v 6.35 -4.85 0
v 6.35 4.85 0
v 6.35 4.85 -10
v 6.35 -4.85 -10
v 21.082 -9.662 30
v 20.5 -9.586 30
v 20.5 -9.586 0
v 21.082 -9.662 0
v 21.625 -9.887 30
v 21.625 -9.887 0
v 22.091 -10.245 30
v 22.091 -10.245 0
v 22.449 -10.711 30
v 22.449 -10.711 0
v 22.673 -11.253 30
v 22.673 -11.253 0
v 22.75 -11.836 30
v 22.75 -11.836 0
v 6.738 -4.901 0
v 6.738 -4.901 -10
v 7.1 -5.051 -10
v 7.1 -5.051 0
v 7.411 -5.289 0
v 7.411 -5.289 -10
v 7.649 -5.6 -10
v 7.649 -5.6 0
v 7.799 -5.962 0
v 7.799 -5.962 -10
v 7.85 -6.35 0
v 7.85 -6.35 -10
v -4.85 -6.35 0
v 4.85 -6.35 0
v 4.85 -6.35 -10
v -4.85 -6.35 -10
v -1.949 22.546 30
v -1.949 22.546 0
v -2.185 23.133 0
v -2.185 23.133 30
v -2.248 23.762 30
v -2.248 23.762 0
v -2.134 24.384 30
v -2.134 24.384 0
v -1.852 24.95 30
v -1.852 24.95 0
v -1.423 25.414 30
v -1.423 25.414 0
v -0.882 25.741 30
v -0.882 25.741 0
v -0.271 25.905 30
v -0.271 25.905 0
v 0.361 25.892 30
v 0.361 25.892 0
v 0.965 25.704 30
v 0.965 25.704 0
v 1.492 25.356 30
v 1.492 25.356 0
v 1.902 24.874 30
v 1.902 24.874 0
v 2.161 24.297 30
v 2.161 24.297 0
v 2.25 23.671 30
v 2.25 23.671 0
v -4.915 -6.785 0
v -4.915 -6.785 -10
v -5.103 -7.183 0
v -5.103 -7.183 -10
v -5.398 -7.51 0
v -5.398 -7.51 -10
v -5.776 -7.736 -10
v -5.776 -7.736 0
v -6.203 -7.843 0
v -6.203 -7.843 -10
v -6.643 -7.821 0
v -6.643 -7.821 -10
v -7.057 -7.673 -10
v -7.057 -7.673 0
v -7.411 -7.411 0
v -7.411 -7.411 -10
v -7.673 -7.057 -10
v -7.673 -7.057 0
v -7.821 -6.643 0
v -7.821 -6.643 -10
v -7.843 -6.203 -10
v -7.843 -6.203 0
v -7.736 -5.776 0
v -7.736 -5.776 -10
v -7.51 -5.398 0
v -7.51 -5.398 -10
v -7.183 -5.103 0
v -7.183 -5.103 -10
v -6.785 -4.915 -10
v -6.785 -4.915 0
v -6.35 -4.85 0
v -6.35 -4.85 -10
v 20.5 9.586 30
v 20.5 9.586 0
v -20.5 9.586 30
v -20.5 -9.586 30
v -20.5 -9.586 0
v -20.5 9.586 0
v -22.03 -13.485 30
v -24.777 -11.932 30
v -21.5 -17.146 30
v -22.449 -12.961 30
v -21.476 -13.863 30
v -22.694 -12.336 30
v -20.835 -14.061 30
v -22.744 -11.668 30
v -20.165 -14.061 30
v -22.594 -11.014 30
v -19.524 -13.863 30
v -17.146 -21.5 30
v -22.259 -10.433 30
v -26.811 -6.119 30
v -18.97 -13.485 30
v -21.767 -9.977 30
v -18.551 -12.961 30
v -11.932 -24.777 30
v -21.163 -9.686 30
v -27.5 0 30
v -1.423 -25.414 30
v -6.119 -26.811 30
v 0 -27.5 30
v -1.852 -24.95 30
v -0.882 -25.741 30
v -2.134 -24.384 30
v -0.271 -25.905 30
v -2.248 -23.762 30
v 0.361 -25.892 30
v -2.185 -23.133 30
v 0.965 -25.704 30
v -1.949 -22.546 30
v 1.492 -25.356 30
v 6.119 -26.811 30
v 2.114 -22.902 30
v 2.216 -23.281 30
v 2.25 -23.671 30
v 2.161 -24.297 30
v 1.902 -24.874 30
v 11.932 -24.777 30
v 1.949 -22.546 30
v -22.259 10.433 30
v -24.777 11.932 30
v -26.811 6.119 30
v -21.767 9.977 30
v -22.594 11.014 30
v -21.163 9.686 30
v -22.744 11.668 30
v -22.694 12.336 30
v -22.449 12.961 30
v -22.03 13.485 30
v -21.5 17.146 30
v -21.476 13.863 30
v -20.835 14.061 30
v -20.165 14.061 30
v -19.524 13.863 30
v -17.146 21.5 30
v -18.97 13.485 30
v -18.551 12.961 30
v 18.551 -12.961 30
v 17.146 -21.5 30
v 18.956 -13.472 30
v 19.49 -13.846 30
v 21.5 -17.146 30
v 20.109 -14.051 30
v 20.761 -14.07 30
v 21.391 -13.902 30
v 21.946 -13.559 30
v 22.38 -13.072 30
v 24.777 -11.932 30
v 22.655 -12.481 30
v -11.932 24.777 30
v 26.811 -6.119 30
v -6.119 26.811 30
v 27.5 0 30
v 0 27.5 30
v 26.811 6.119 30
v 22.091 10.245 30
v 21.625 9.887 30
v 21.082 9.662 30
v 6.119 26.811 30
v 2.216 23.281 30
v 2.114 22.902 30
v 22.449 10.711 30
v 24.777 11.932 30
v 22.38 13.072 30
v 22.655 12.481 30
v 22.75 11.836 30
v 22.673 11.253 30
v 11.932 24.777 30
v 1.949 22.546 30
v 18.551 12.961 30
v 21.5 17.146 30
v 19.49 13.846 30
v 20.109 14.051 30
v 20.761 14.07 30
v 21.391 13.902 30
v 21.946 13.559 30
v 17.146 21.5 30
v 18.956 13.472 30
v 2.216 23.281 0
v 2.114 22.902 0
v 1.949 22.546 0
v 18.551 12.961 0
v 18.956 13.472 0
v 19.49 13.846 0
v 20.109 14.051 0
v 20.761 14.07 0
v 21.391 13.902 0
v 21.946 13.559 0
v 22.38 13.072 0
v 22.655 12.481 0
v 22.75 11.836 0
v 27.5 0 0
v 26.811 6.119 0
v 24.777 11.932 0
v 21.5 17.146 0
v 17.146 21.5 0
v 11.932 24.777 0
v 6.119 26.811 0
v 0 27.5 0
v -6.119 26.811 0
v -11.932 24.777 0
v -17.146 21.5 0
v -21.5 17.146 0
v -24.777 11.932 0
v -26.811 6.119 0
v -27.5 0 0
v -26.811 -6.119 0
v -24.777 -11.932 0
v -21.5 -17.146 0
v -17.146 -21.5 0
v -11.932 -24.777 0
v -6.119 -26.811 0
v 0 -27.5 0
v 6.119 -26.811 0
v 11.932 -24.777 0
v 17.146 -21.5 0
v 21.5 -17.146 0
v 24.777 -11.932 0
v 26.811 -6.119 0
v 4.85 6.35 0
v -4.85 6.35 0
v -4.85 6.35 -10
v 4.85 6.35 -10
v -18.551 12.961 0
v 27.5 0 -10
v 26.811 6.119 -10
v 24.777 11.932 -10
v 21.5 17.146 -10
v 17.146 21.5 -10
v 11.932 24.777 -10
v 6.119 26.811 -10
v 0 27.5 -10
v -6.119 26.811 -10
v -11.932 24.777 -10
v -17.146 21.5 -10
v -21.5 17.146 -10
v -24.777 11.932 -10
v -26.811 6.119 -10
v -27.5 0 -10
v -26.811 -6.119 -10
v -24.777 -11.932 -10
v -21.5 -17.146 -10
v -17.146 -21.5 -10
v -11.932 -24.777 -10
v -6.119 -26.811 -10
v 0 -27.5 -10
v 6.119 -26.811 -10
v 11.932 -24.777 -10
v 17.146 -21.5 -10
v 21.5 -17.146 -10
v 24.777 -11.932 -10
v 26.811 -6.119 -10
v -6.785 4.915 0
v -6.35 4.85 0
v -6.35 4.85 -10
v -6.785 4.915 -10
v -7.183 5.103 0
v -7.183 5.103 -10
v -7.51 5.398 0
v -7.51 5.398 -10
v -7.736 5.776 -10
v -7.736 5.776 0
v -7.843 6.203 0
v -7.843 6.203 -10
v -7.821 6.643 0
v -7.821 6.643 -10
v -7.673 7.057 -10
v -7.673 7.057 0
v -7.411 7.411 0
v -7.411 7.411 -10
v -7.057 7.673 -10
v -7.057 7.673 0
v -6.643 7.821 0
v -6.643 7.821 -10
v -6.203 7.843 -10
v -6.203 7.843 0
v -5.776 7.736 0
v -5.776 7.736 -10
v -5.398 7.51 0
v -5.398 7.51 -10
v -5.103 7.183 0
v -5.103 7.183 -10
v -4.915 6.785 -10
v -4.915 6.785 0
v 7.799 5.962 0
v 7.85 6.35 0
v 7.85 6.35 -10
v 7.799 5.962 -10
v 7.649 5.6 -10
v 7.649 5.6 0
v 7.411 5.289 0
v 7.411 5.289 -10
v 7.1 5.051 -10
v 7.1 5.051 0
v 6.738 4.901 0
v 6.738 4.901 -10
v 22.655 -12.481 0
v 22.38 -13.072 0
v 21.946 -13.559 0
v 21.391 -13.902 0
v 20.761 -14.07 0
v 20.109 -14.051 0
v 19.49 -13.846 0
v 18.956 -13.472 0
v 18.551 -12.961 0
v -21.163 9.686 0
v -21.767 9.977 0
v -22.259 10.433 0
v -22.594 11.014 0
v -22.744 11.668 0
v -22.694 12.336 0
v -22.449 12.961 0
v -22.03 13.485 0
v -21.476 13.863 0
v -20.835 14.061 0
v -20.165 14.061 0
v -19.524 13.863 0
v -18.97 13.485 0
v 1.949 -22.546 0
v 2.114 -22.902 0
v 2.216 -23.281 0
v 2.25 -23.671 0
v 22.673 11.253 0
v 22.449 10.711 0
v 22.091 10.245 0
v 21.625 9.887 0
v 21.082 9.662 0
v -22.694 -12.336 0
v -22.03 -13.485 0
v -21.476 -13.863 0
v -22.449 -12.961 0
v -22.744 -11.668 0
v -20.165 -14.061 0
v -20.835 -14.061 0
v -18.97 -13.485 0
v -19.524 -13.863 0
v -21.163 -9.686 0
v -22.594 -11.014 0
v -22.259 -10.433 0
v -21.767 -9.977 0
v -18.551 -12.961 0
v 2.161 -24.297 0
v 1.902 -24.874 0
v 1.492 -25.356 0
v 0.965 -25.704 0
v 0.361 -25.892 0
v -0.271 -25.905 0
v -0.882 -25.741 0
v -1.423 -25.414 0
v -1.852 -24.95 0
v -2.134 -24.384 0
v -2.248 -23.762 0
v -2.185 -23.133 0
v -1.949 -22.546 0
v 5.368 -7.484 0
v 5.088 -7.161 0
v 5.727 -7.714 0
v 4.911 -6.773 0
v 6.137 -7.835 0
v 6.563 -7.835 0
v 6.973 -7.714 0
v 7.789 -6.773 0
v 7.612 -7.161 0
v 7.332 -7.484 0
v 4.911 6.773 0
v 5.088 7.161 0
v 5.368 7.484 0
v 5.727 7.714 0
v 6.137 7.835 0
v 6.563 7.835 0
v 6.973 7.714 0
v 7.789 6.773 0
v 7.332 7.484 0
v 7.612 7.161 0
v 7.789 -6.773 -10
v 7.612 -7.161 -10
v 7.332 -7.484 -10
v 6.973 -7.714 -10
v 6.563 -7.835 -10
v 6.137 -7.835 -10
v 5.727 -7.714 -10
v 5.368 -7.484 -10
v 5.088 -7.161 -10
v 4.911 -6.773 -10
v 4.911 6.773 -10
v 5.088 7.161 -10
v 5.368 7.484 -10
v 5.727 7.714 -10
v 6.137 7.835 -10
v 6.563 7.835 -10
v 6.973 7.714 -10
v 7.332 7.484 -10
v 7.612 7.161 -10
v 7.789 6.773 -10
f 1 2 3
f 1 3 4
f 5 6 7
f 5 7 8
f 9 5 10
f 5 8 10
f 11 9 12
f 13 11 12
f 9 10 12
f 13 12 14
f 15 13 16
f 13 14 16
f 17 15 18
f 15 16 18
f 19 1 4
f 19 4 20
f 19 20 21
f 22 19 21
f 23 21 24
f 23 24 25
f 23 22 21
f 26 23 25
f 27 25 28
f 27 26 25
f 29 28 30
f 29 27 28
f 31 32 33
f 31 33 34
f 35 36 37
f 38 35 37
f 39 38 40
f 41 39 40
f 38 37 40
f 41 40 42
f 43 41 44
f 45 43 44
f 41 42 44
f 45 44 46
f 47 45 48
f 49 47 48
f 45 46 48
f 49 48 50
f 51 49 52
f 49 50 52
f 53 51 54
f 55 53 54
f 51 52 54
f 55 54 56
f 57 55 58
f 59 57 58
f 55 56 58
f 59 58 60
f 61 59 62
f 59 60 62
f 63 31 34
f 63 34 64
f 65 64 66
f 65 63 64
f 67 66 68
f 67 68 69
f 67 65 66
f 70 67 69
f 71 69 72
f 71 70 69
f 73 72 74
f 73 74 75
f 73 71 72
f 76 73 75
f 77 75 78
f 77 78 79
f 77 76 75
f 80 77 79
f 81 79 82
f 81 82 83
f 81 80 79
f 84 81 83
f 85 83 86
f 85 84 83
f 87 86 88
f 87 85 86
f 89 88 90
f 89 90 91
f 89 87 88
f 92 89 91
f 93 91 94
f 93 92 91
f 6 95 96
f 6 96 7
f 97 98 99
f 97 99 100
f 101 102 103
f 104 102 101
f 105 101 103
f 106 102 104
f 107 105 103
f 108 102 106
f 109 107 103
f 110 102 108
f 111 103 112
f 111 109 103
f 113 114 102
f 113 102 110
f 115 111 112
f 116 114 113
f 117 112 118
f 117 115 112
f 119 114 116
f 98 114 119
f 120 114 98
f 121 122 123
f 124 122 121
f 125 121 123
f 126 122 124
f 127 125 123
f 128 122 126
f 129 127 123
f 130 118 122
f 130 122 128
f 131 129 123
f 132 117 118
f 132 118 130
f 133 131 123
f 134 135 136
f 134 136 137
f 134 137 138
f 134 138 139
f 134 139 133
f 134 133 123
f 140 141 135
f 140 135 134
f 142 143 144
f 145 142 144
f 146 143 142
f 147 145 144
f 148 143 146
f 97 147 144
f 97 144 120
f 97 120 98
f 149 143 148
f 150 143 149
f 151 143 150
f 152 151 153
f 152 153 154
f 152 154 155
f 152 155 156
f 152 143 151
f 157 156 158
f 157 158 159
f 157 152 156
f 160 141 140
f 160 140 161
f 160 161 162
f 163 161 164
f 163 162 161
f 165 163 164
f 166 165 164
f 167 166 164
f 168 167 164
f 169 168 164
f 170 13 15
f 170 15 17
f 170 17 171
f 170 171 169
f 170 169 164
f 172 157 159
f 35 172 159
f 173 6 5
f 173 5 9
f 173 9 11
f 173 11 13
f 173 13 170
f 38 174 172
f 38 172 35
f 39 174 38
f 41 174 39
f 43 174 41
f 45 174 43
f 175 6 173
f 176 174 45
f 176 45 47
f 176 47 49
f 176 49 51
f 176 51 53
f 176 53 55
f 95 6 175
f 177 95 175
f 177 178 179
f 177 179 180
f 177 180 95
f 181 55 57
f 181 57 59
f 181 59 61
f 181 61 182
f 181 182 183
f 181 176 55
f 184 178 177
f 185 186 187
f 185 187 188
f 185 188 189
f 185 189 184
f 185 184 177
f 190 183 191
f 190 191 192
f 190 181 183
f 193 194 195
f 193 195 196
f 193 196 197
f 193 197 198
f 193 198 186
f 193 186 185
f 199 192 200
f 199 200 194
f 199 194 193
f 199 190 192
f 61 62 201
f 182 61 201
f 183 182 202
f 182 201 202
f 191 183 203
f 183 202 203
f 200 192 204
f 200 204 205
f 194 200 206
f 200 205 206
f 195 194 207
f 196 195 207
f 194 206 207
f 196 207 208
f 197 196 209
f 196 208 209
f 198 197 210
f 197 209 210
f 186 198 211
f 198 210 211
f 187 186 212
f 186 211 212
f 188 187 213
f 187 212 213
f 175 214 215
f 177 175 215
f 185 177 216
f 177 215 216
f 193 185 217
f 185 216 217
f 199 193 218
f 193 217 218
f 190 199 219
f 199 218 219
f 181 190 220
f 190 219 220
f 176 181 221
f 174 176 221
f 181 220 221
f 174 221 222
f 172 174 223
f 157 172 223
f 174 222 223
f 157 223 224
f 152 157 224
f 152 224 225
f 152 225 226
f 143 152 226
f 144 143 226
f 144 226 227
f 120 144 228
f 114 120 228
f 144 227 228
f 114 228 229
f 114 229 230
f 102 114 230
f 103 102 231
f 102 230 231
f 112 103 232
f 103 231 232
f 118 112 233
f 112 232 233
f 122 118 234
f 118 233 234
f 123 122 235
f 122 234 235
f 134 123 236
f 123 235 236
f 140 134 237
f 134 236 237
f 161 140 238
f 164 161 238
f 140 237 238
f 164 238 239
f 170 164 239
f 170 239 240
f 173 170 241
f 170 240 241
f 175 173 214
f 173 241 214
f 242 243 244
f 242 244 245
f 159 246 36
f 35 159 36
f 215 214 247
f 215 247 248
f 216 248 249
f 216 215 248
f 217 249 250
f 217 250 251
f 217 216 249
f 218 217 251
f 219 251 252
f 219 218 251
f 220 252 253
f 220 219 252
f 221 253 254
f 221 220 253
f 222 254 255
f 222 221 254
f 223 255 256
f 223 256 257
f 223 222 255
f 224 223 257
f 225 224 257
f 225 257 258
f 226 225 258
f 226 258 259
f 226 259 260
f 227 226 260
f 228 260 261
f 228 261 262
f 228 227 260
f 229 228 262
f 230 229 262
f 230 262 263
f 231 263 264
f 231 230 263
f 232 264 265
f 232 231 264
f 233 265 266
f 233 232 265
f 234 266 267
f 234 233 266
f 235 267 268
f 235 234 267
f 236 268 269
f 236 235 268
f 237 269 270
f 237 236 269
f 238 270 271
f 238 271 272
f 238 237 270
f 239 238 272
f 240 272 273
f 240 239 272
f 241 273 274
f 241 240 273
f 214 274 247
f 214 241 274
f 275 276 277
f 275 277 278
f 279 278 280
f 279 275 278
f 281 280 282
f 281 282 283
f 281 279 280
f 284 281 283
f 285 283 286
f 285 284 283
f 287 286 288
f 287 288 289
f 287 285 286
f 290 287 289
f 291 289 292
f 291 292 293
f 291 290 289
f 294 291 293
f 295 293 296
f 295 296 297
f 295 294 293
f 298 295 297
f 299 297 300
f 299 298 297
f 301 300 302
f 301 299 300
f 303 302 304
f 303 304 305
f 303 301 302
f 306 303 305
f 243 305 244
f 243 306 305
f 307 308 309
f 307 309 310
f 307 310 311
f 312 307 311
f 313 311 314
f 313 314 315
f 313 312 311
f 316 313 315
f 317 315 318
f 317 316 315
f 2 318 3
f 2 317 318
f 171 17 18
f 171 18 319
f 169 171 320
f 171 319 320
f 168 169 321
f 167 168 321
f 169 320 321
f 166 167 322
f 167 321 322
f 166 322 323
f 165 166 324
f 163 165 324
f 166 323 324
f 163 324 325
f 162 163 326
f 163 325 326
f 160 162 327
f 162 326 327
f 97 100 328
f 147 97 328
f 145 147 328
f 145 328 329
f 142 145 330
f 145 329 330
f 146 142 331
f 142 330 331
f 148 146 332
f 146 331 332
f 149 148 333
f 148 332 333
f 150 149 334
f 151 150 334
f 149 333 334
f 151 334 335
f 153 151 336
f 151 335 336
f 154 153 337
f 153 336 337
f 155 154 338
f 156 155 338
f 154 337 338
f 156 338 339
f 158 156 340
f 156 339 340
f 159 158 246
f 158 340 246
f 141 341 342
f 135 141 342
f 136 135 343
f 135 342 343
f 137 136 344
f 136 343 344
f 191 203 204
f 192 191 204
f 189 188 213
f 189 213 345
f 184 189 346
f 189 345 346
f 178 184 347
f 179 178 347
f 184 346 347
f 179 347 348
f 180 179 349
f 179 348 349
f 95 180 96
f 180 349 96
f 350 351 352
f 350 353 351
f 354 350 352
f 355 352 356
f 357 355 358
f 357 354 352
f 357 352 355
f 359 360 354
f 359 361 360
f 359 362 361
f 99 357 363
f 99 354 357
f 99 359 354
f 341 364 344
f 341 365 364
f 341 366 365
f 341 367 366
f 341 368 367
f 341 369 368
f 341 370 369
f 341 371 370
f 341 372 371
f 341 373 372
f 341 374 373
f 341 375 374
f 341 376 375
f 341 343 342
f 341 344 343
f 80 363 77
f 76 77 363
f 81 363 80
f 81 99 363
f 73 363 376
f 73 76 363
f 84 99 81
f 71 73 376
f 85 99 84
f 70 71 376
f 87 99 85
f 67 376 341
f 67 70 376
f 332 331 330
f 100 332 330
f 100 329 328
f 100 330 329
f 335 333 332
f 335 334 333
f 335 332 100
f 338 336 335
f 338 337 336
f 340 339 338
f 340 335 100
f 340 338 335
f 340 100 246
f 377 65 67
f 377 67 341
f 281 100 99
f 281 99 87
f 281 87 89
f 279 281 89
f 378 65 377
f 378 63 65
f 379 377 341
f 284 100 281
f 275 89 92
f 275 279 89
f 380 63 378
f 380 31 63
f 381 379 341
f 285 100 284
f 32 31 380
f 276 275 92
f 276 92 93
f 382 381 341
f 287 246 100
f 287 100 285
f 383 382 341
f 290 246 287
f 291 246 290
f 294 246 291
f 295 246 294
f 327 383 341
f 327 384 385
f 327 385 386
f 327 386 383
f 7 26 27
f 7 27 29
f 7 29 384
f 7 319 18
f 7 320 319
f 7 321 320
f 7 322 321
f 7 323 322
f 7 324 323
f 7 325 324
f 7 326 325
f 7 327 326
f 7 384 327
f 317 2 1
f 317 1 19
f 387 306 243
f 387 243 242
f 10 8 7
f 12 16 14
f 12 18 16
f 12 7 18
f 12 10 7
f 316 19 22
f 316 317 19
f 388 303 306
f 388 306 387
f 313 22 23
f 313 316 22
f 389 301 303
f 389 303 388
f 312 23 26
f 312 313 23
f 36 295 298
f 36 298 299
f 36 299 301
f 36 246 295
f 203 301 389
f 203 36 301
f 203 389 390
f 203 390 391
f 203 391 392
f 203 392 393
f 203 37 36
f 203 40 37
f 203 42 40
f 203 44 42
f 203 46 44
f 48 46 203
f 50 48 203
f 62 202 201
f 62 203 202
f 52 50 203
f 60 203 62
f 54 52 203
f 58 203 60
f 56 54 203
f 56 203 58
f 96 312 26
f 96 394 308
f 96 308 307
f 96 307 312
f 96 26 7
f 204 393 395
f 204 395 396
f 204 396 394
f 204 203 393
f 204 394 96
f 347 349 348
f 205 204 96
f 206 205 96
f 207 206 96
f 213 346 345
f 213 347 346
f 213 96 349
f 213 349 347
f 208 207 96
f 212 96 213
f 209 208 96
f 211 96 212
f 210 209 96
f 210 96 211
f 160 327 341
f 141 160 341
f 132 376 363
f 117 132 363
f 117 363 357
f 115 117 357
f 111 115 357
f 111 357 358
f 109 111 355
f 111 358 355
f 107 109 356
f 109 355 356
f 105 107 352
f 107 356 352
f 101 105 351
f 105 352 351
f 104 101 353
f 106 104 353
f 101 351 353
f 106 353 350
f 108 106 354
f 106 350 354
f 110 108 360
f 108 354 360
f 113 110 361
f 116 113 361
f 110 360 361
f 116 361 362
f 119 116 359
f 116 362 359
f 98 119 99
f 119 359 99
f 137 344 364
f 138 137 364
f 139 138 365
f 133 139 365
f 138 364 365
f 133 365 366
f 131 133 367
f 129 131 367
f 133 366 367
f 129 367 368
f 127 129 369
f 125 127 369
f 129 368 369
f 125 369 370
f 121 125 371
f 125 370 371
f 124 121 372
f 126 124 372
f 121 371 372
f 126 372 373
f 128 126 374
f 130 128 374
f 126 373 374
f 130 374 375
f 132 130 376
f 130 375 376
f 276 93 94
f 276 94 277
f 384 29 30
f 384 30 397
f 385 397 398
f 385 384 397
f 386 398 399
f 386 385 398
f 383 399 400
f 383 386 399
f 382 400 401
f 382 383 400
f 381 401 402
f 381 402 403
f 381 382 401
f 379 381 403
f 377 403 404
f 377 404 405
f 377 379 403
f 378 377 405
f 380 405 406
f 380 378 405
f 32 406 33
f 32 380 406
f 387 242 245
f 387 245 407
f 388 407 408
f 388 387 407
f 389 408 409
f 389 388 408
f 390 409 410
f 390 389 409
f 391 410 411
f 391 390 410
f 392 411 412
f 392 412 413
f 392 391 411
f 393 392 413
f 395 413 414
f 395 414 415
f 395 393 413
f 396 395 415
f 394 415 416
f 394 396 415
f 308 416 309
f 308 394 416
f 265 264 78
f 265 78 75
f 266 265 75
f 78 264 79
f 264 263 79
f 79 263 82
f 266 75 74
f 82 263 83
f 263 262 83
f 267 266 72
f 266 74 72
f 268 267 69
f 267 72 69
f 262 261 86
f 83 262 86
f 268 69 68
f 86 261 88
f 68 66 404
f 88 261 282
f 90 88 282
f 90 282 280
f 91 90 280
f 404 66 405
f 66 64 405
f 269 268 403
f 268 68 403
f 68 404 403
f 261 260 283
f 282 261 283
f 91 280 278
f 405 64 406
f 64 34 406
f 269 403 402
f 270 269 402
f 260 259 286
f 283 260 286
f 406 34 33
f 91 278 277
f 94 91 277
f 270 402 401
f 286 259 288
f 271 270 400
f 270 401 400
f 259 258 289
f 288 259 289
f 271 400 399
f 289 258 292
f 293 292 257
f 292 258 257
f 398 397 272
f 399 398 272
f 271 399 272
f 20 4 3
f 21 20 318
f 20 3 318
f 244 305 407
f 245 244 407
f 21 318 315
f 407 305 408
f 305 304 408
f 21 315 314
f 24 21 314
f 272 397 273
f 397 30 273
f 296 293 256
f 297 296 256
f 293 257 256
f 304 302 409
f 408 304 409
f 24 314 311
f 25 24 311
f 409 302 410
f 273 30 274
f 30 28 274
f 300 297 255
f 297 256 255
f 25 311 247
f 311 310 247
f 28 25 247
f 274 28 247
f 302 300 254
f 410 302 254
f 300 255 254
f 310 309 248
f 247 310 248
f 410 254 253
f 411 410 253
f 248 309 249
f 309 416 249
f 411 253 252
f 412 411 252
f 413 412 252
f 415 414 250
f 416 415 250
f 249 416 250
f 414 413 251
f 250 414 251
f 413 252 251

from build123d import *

# Parameters (mm, degrees)
F0_R     = 27.5
F1_DEPTH = 10
F2_DEPTH = 30


with BuildPart() as f1:
    # F0 (on Top) → F1 (new body)
    with BuildSketch(Plane.XY):
        Circle(F0_R)
        with BuildLine():
            ThreePointArc((22.75, 11.8356805184), (22.0909902577, 10.2446902607), (20.5, 9.5856805184))
            Line((20.5, 9.5856805184), (20.5, -9.5856805184))
            ThreePointArc((20.5, -9.5856805184), (22.0909902577, -10.2446902607), (22.75, -11.8356805184))
            ThreePointArc((22.75, -11.8356805184), (21.0823428515, -14.0090136275), (18.5514428415, -12.9606805184))
            Line((18.5514428415, -12.9606805184), (1.9485571585, -22.5463610368))
            ThreePointArc((1.9485571585, -22.5463610368), (2.1733331092, -23.0890181853), (2.25, -23.6713610368))
            ThreePointArc((2.25, -23.6713610368), (-0.5823428515, -25.8446941459), (-1.9485571585, -22.5463610368))
            Line((-1.9485571585, -22.5463610368), (-18.5514428415, -12.9606805184))
            ThreePointArc((-18.5514428415, -12.9606805184), (-22.4485571585, -12.9606805184), (-20.5, -9.5856805184))
            Line((-20.5, -9.5856805184), (-20.5, 9.5856805184))
            ThreePointArc((-20.5, 9.5856805184), (-22.4485571585, 12.9606805184), (-18.5514428415, 12.9606805184))
            Line((-18.5514428415, 12.9606805184), (-1.9485571585, 22.5463610368))
            ThreePointArc((-1.9485571585, 22.5463610368), (-0.5823428515, 25.8446941459), (2.25, 23.6713610368))
            ThreePointArc((2.25, 23.6713610368), (2.1733331092, 23.0890181853), (1.9485571585, 22.5463610368))
            Line((1.9485571585, 22.5463610368), (18.5514428415, 12.9606805184))
            ThreePointArc((18.5514428415, 12.9606805184), (21.0823428515, 14.0090136275), (22.75, 11.8356805184))
        make_face(mode=Mode.SUBTRACT)
        with BuildLine():
            Line((20.5, -9.5856805184), (20.5, 9.5856805184))
            ThreePointArc((20.5, 9.5856805184), (18.5514428415, 10.7106805184), (18.5514428415, 12.9606805184))
            Line((18.5514428415, 12.9606805184), (1.9485571585, 22.5463610368))
            ThreePointArc((1.9485571585, 22.5463610368), (0, 21.4213610368), (-1.9485571585, 22.5463610368))
            Line((-1.9485571585, 22.5463610368), (-18.5514428415, 12.9606805184))
            ThreePointArc((-18.5514428415, 12.9606805184), (-18.3266668908, 12.4180233699), (-18.25, 11.8356805184))
            ThreePointArc((-18.25, 11.8356805184), (-18.9090097423, 10.2446902607), (-20.5, 9.5856805184))
            Line((-20.5, 9.5856805184), (-20.5, -9.5856805184))
            ThreePointArc((-20.5, -9.5856805184), (-18.9090097423, -10.2446902607), (-18.25, -11.8356805184))
            ThreePointArc((-18.25, -11.8356805184), (-18.3266668908, -12.4180233699), (-18.5514428415, -12.9606805184))
            Line((-18.5514428415, -12.9606805184), (-1.9485571585, -22.5463610368))
            ThreePointArc((-1.9485571585, -22.5463610368), (0, -21.4213610368), (1.9485571585, -22.5463610368))
            Line((1.9485571585, -22.5463610368), (18.5514428415, -12.9606805184))
            ThreePointArc((18.5514428415, -12.9606805184), (18.5514428415, -10.7106805184), (20.5, -9.5856805184))
        make_face()
        with BuildLine():
            ThreePointArc((-6.35, 4.85), (-7.4106601718, 7.4106601718), (-4.85, 6.35))
            Line((-4.85, 6.35), (4.85, 6.35))
            ThreePointArc((4.85, 6.35), (6.35, 7.85), (7.85, 6.35))
            ThreePointArc((7.85, 6.35), (7.4106601718, 5.2893398282), (6.35, 4.85))
            Line((6.35, 4.85), (6.35, -4.85))
            ThreePointArc((6.35, -4.85), (7.4106601718, -5.2893398282), (7.85, -6.35))
            ThreePointArc((7.85, -6.35), (6.35, -7.85), (4.85, -6.35))
            Line((4.85, -6.35), (-4.85, -6.35))
            ThreePointArc((-4.85, -6.35), (-7.4106601718, -7.4106601718), (-6.35, -4.85))
            Line((-6.35, -4.85), (-6.35, 4.85))
        make_face(mode=Mode.SUBTRACT)
        with BuildLine():
            Line((-20.5, 11.8356805184), (-18.5514428415, 12.9606805184))
            ThreePointArc((-18.5514428415, 12.9606805184), (-22.4485571585, 12.9606805184), (-20.5, 9.5856805184))
            Line((-20.5, 9.5856805184), (-20.5, 11.8356805184))
        make_face()
        with BuildLine():
            ThreePointArc((-20.5, -9.5856805184), (-22.4485571585, -12.9606805184), (-18.5514428415, -12.9606805184))
            Line((-18.5514428415, -12.9606805184), (-20.5, -11.8356805184))
            Line((-20.5, -11.8356805184), (-20.5, -9.5856805184))
        make_face()
        with BuildLine():
            Line((0, 23.6713610368), (1.9485571585, 22.5463610368))
            ThreePointArc((1.9485571585, 22.5463610368), (2.1733331092, 23.0890181853), (2.25, 23.6713610368))
            ThreePointArc((2.25, 23.6713610368), (-0.5823428515, 25.8446941459), (-1.9485571585, 22.5463610368))
            Line((-1.9485571585, 22.5463610368), (0, 23.6713610368))
        make_face()
        with BuildLine():
            Line((18.5514428415, 12.9606805184), (20.5, 11.8356805184))
            Line((20.5, 11.8356805184), (20.5, 9.5856805184))
            ThreePointArc((20.5, 9.5856805184), (22.0909902577, 10.2446902607), (22.75, 11.8356805184))
            ThreePointArc((22.75, 11.8356805184), (21.0823428515, 14.0090136275), (18.5514428415, 12.9606805184))
        make_face()
        with BuildLine():
            ThreePointArc((22.75, -11.8356805184), (22.0909902577, -10.2446902607), (20.5, -9.5856805184))
            Line((20.5, -9.5856805184), (20.5, -11.8356805184))
            Line((20.5, -11.8356805184), (18.5514428415, -12.9606805184))
            ThreePointArc((18.5514428415, -12.9606805184), (21.0823428515, -14.0090136275), (22.75, -11.8356805184))
        make_face()
        with BuildLine():
            ThreePointArc((2.25, -23.6713610368), (2.1733331092, -23.0890181853), (1.9485571585, -22.5463610368))
            Line((1.9485571585, -22.5463610368), (0, -23.6713610368))
            Line((0, -23.6713610368), (-1.9485571585, -22.5463610368))
            ThreePointArc((-1.9485571585, -22.5463610368), (-0.5823428515, -25.8446941459), (2.25, -23.6713610368))
        make_face()
        with BuildLine():
            Line((-20.5, -11.8356805184), (-18.5514428415, -12.9606805184))
            ThreePointArc((-18.5514428415, -12.9606805184), (-18.3266668908, -12.4180233699), (-18.25, -11.8356805184))
            ThreePointArc((-18.25, -11.8356805184), (-18.9090097423, -10.2446902607), (-20.5, -9.5856805184))
            Line((-20.5, -9.5856805184), (-20.5, -11.8356805184))
        make_face()
        with BuildLine():
            ThreePointArc((-18.25, 11.8356805184), (-18.3266668908, 12.4180233699), (-18.5514428415, 12.9606805184))
            Line((-18.5514428415, 12.9606805184), (-20.5, 11.8356805184))
            Line((-20.5, 11.8356805184), (-20.5, 9.5856805184))
            ThreePointArc((-20.5, 9.5856805184), (-18.9090097423, 10.2446902607), (-18.25, 11.8356805184))
        make_face()
        with BuildLine():
            ThreePointArc((-1.9485571585, 22.5463610368), (0, 21.4213610368), (1.9485571585, 22.5463610368))
            Line((1.9485571585, 22.5463610368), (0, 23.6713610368))
            Line((0, 23.6713610368), (-1.9485571585, 22.5463610368))
        make_face()
        with BuildLine():
            Line((20.5, 9.5856805184), (20.5, 11.8356805184))
            Line((20.5, 11.8356805184), (18.5514428415, 12.9606805184))
            ThreePointArc((18.5514428415, 12.9606805184), (18.5514428415, 10.7106805184), (20.5, 9.5856805184))
        make_face()
        with BuildLine():
            Line((20.5, -11.8356805184), (20.5, -9.5856805184))
            ThreePointArc((20.5, -9.5856805184), (18.5514428415, -10.7106805184), (18.5514428415, -12.9606805184))
            Line((18.5514428415, -12.9606805184), (20.5, -11.8356805184))
        make_face()
        with BuildLine():
            Line((0, -23.6713610368), (1.9485571585, -22.5463610368))
            ThreePointArc((1.9485571585, -22.5463610368), (0, -21.4213610368), (-1.9485571585, -22.5463610368))
            Line((-1.9485571585, -22.5463610368), (0, -23.6713610368))
        make_face()
    extrude(amount=-F1_DEPTH)

    # F0 (on Top) → F2 (join)
    with BuildSketch(Plane.XY):
        Circle(F0_R)
        with BuildLine():
            ThreePointArc((22.75, 11.8356805184), (22.0909902577, 10.2446902607), (20.5, 9.5856805184))
            Line((20.5, 9.5856805184), (20.5, -9.5856805184))
            ThreePointArc((20.5, -9.5856805184), (22.0909902577, -10.2446902607), (22.75, -11.8356805184))
            ThreePointArc((22.75, -11.8356805184), (21.0823428515, -14.0090136275), (18.5514428415, -12.9606805184))
            Line((18.5514428415, -12.9606805184), (1.9485571585, -22.5463610368))
            ThreePointArc((1.9485571585, -22.5463610368), (2.1733331092, -23.0890181853), (2.25, -23.6713610368))
            ThreePointArc((2.25, -23.6713610368), (-0.5823428515, -25.8446941459), (-1.9485571585, -22.5463610368))
            Line((-1.9485571585, -22.5463610368), (-18.5514428415, -12.9606805184))
            ThreePointArc((-18.5514428415, -12.9606805184), (-22.4485571585, -12.9606805184), (-20.5, -9.5856805184))
            Line((-20.5, -9.5856805184), (-20.5, 9.5856805184))
            ThreePointArc((-20.5, 9.5856805184), (-22.4485571585, 12.9606805184), (-18.5514428415, 12.9606805184))
            Line((-18.5514428415, 12.9606805184), (-1.9485571585, 22.5463610368))
            ThreePointArc((-1.9485571585, 22.5463610368), (-0.5823428515, 25.8446941459), (2.25, 23.6713610368))
            ThreePointArc((2.25, 23.6713610368), (2.1733331092, 23.0890181853), (1.9485571585, 22.5463610368))
            Line((1.9485571585, 22.5463610368), (18.5514428415, 12.9606805184))
            ThreePointArc((18.5514428415, 12.9606805184), (21.0823428515, 14.0090136275), (22.75, 11.8356805184))
        make_face(mode=Mode.SUBTRACT)
    extrude(amount=F2_DEPTH)


solid = f1.part
